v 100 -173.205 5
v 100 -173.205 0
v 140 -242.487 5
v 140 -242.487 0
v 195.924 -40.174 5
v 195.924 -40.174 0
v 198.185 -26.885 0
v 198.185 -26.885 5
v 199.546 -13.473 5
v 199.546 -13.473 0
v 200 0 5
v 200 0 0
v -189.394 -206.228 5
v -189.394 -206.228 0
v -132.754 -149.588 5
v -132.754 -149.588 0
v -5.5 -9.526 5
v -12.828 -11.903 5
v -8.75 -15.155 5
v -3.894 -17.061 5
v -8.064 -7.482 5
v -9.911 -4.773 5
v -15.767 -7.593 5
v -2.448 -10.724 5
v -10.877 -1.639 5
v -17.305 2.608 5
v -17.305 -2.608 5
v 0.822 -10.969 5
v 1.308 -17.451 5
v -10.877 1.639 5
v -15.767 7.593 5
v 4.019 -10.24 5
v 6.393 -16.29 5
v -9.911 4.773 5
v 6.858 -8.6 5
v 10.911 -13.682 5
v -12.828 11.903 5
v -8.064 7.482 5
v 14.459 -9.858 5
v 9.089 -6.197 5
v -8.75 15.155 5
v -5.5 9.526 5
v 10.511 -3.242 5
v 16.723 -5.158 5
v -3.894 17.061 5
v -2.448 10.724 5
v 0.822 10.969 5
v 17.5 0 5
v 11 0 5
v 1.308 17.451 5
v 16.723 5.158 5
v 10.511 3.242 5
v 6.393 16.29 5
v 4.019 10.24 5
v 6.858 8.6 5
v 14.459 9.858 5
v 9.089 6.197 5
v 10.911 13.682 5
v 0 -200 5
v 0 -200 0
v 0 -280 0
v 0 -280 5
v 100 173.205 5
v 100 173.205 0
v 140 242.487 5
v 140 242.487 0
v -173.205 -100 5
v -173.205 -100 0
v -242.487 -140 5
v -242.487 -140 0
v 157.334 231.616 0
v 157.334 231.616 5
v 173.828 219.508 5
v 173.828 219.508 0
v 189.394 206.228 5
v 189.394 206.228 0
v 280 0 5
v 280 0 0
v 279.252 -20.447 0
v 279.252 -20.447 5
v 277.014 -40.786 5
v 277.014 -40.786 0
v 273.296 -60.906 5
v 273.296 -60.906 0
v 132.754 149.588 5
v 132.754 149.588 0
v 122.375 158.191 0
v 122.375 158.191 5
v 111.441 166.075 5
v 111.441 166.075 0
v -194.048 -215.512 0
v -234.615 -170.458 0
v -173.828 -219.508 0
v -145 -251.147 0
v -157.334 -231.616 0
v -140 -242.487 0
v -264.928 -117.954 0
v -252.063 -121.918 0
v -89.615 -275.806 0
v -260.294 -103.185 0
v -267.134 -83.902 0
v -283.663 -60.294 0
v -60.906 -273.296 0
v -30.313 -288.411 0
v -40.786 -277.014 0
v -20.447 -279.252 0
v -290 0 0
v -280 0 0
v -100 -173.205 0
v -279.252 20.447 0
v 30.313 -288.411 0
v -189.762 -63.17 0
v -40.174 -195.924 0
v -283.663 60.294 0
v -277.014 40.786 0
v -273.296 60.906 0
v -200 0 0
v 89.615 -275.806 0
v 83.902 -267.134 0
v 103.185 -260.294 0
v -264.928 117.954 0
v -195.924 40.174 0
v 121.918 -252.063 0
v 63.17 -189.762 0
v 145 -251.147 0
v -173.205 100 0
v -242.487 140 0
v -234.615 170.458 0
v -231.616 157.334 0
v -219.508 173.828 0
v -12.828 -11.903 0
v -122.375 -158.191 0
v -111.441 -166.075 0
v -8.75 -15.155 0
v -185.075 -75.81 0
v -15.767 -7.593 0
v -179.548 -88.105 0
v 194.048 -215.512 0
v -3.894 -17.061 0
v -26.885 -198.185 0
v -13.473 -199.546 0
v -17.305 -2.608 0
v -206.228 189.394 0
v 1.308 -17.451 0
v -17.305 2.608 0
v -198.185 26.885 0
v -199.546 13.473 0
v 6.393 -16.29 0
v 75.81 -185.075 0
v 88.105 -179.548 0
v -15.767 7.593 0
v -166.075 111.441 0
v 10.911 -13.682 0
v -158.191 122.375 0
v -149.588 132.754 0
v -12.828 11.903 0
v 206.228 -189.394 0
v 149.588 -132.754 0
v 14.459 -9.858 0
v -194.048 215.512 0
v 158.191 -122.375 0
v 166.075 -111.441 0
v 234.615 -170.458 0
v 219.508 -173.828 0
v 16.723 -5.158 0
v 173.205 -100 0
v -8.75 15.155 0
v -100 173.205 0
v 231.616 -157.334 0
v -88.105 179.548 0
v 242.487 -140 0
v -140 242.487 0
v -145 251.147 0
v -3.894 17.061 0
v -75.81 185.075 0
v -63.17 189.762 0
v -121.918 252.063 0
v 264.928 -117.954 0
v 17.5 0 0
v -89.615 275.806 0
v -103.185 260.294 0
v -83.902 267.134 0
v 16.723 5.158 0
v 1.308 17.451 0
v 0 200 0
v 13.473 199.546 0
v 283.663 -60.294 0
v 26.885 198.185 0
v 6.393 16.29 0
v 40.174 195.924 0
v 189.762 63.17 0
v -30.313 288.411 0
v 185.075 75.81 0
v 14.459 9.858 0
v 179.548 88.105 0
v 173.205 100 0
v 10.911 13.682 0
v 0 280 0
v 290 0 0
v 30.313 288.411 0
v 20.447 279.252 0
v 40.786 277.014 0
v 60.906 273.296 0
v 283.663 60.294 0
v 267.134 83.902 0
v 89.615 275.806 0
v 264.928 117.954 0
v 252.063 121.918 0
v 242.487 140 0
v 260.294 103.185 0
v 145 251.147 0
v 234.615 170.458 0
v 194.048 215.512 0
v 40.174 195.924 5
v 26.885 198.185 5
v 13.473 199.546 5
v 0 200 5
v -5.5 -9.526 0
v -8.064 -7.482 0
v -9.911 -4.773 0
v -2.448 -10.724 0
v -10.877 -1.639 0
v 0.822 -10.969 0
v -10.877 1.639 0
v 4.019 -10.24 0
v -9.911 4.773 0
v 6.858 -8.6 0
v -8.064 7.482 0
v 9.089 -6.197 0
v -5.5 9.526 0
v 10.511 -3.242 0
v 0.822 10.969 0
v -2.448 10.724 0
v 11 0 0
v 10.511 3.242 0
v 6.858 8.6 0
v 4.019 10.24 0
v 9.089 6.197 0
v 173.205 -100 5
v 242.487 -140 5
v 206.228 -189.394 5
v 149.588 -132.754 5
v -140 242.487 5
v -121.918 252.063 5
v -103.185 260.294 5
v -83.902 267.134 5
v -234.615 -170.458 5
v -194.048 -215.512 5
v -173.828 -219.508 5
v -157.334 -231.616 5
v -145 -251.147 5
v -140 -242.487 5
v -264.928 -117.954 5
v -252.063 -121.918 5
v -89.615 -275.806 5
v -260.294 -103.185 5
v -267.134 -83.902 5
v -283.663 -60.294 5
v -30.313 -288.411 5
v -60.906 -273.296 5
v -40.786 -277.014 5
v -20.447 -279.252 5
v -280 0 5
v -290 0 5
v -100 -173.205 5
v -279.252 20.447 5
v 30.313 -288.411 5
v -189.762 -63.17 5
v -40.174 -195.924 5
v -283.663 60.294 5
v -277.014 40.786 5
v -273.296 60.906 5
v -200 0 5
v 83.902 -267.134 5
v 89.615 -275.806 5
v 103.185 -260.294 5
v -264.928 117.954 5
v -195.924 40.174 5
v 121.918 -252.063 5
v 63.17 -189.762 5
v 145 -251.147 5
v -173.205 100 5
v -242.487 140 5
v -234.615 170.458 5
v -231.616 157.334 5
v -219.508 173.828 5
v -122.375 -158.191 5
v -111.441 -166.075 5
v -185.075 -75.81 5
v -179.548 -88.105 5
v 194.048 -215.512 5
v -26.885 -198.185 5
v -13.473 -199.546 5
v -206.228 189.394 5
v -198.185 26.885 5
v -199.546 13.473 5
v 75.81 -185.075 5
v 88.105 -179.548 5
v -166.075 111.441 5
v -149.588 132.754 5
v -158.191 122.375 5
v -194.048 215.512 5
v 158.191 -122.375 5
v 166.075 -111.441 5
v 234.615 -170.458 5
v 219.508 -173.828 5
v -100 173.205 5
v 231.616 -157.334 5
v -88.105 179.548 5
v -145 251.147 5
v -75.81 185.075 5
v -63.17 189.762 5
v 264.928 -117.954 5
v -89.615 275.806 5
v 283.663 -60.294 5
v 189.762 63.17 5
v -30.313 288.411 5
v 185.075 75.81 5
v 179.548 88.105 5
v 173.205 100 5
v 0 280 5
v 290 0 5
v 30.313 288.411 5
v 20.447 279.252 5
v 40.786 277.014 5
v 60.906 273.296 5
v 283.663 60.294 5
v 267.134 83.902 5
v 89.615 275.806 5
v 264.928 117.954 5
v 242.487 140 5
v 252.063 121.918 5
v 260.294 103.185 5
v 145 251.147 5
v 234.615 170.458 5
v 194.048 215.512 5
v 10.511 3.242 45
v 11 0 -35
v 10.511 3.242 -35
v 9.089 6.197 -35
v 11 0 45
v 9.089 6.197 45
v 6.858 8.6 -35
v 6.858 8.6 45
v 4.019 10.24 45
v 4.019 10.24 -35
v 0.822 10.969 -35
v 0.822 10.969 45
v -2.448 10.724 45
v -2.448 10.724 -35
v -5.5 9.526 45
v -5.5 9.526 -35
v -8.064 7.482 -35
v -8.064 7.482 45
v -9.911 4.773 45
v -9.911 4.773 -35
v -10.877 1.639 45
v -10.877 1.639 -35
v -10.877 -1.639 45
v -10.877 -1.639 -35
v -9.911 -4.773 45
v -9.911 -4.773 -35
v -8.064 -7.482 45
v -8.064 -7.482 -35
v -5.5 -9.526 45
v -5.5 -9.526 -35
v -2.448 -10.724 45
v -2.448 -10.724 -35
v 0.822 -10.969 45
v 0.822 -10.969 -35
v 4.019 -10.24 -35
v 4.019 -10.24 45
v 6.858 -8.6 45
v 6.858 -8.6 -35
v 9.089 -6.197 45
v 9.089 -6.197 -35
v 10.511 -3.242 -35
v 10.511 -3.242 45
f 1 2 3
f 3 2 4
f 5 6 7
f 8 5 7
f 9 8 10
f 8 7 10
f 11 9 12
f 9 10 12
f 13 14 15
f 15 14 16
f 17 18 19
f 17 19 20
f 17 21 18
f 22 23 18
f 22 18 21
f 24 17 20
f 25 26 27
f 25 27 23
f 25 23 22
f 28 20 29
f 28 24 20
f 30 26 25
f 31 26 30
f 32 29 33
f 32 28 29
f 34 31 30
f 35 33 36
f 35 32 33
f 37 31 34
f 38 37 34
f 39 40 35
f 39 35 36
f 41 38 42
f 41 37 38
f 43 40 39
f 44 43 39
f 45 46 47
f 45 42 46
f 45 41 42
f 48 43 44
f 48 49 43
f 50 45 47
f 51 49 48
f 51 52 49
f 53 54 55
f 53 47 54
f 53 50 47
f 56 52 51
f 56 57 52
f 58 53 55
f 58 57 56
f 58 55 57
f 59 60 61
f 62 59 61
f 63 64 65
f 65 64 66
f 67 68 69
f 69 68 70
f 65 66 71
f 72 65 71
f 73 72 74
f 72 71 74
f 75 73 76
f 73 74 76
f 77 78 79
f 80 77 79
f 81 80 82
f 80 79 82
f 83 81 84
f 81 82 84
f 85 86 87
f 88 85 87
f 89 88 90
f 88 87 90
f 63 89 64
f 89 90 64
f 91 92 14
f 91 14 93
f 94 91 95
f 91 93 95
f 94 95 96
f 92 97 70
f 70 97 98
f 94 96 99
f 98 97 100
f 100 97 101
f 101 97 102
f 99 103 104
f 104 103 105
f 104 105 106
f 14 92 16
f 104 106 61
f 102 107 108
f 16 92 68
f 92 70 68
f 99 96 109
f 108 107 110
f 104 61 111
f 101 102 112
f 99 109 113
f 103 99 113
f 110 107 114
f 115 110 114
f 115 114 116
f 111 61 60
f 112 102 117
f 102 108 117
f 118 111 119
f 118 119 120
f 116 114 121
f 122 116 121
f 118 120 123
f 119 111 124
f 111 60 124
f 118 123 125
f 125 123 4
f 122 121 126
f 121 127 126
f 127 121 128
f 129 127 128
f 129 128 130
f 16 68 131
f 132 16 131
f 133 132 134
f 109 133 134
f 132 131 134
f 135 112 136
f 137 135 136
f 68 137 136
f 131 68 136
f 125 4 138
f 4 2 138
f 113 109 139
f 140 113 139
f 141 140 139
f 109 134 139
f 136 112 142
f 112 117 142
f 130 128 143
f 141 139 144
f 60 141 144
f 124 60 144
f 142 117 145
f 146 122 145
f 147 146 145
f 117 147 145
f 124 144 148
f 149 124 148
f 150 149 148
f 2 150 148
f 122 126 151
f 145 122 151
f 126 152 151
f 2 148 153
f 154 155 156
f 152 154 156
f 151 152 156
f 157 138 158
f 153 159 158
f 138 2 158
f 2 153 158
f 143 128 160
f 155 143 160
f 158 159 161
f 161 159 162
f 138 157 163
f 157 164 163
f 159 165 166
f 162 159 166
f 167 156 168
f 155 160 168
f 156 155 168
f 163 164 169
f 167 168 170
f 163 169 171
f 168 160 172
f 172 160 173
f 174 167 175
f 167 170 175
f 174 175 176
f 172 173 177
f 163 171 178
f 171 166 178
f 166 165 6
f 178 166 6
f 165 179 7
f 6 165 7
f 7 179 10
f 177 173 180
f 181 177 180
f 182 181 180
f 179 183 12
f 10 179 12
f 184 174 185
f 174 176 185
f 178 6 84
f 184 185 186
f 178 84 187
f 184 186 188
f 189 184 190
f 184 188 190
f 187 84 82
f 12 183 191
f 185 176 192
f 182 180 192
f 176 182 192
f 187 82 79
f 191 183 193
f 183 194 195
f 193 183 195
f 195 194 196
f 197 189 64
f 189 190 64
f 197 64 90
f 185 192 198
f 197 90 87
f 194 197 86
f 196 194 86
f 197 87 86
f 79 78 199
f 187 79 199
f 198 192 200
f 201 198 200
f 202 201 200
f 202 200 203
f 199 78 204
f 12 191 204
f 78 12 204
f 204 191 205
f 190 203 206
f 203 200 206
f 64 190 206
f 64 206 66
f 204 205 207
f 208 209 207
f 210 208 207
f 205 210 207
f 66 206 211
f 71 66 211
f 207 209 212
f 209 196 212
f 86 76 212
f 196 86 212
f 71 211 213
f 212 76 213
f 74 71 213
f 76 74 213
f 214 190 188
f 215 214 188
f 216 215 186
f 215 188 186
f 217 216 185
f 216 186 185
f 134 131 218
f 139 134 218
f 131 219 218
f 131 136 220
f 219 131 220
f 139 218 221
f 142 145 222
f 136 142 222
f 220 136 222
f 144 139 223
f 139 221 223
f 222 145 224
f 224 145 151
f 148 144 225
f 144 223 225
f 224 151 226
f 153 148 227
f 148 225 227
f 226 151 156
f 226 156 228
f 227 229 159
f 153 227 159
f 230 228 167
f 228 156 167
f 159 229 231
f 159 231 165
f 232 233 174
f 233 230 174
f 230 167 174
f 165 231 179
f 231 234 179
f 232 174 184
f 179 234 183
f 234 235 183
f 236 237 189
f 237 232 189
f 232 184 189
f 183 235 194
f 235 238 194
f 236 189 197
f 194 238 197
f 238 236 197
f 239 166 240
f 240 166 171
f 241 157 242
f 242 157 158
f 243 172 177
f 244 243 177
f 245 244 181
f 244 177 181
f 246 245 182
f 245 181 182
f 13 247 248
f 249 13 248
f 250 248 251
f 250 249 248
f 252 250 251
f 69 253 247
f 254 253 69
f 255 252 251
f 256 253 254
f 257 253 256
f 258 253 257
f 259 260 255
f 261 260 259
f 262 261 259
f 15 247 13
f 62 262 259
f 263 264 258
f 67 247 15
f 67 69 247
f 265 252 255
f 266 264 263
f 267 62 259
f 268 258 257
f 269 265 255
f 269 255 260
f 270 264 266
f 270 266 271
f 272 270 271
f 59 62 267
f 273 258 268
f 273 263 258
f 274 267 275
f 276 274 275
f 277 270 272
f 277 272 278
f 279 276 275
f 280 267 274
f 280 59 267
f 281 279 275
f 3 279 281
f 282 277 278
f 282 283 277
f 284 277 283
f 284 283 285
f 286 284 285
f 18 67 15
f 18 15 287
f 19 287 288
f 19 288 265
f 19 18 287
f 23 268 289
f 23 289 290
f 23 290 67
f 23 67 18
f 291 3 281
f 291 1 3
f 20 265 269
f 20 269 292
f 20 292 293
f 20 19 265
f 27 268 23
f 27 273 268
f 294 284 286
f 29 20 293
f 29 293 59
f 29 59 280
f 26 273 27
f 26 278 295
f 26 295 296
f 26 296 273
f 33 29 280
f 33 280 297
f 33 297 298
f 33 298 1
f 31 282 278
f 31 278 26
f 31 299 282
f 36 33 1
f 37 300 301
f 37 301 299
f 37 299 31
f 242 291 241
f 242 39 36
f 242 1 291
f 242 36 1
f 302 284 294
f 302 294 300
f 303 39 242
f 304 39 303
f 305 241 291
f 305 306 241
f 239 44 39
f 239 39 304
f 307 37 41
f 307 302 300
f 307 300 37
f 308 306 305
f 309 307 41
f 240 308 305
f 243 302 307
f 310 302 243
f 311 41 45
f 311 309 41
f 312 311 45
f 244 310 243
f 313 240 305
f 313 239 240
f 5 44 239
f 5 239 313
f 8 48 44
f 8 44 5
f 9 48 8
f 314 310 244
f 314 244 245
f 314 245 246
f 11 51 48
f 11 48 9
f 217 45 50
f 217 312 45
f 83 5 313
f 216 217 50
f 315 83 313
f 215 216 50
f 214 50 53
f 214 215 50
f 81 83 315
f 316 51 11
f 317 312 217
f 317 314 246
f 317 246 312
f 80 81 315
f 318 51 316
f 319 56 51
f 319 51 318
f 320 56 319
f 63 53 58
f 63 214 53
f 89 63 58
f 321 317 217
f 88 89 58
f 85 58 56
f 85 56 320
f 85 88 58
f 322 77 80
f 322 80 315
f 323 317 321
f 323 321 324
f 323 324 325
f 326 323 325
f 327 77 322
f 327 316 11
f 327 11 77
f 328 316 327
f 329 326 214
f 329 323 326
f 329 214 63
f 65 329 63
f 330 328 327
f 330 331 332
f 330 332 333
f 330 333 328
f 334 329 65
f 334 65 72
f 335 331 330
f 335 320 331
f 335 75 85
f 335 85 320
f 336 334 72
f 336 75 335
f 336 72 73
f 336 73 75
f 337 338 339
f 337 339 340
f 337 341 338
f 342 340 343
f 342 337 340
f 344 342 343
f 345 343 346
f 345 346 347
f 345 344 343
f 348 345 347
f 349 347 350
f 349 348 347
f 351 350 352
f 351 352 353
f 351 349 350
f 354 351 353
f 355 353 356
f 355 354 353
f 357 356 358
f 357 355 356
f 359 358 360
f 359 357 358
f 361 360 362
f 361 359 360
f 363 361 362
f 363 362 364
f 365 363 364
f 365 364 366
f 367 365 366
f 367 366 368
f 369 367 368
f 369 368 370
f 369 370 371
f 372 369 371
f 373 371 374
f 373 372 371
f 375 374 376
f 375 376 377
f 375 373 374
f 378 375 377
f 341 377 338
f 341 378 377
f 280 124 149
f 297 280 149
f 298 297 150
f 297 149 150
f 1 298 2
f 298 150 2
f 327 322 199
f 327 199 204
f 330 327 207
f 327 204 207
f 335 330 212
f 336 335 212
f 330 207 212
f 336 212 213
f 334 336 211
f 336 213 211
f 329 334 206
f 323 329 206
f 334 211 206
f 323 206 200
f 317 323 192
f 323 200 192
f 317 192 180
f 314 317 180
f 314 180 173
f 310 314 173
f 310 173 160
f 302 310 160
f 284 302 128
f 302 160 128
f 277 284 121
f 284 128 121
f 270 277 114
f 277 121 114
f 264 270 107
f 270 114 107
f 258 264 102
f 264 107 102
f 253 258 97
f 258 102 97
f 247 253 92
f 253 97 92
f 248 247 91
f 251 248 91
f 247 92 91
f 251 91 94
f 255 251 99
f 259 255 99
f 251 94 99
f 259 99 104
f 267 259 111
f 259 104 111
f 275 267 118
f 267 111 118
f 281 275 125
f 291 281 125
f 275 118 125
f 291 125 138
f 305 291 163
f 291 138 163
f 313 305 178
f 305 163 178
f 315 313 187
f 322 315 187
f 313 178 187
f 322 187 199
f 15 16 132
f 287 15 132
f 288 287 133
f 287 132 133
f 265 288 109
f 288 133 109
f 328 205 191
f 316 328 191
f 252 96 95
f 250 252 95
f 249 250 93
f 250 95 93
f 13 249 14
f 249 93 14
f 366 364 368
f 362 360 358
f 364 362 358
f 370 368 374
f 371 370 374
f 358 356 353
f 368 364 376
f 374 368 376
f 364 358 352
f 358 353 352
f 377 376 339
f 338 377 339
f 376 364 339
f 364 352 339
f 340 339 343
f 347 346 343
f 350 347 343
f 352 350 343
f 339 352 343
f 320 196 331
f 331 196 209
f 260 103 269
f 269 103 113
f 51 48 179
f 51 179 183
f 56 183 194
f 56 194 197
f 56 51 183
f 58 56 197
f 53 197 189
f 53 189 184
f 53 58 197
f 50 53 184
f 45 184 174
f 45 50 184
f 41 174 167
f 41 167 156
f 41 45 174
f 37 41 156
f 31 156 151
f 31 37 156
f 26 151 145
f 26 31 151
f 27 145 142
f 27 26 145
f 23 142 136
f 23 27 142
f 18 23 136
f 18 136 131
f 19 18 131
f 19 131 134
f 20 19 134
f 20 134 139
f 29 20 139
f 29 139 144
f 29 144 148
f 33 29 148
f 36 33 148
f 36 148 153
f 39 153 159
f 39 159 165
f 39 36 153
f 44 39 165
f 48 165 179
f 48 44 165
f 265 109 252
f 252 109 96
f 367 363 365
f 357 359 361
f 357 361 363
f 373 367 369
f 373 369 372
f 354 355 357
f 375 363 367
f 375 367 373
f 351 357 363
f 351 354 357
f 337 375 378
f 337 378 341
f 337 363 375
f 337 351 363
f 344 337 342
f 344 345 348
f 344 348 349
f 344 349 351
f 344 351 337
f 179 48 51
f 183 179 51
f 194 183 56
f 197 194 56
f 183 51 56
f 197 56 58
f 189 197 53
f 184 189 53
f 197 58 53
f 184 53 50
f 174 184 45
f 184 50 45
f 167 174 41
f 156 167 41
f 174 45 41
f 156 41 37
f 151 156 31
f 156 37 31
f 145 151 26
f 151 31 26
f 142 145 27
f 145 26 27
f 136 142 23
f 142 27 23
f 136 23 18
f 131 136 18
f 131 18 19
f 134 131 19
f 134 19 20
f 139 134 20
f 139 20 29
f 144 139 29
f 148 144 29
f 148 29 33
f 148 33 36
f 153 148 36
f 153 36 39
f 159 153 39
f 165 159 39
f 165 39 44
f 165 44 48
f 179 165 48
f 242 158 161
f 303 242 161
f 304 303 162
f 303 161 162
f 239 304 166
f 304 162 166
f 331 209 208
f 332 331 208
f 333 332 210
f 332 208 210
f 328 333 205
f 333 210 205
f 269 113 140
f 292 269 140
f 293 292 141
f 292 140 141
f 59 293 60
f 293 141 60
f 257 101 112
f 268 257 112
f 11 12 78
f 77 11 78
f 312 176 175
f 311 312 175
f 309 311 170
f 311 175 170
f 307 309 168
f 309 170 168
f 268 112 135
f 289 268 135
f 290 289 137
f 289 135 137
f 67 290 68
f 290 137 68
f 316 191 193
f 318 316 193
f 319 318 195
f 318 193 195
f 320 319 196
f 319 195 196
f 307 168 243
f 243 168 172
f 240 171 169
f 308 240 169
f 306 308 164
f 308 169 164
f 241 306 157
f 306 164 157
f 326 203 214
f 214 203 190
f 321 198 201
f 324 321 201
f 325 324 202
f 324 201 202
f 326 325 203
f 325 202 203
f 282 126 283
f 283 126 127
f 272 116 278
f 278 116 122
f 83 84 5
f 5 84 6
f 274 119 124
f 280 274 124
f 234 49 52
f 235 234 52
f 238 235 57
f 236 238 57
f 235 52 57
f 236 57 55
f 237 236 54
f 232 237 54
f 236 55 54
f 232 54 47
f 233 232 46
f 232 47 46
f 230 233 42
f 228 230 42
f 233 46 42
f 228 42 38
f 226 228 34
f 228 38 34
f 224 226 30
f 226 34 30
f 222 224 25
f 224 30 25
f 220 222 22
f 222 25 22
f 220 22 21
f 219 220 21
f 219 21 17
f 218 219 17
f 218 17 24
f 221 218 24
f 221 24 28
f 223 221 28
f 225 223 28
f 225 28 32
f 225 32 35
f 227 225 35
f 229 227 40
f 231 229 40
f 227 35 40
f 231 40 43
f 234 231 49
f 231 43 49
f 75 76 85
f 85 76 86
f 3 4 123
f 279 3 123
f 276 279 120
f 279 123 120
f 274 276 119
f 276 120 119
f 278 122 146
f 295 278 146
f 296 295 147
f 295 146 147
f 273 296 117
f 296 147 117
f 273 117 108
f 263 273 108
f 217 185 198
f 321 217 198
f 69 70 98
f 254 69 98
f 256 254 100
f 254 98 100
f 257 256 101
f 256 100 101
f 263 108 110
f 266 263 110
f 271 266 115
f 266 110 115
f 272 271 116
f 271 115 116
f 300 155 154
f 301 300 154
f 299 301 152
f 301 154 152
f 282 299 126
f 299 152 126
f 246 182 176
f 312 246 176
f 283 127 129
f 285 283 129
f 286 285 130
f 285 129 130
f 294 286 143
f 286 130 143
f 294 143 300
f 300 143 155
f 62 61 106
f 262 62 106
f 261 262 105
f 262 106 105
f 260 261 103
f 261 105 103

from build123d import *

# Parameters (mm, degrees)
F0_R      = 290
F1_DEPTH  = 5
F2_R      = 11
F3_DEPTH  = 25
F4_DEPTH  = 40
F5_R      = 143.6188138999
F5_R_2    = 11
F6_DEPTH  = 5
F7_R      = 17.5
F7_R_2    = 11
F8_DEPTH  = 25
F9_R      = 17.5
F9_R_2    = 11
F10_DEPTH = 5


with BuildPart() as f1:
    # F0 (on Top) → F1 (new body)
    with BuildSketch(Plane.XY):
        Circle(F0_R)
        with BuildLine():
            Line((-60.9060232783, -273.2955475825), (-40.1742534792, -195.9235293613))
            ThreePointArc((-40.1742534792, -195.9235293613), (-20.1902715155, -198.9782725227), (0, -200))
            Line((0, -200), (0, -280))
            ThreePointArc((0, -280), (-30.6369603331, -278.3188399328), (-60.9060232783, -273.2955475825))
        make_face(mode=Mode.SUBTRACT)
        with BuildLine():
            Line((-189.3939371938, -206.2278753084), (-132.7536887717, -149.5876268864))
            ThreePointArc((-132.7536887717, -149.5876268864), (-116.9744243031, -162.2251030481), (-100, -173.2050807569))
            Line((-100, -173.2050807569), (-140, -242.4871130596))
            ThreePointArc((-140, -242.4871130596), (-165.6918059096, -225.7127055671), (-189.3939371938, -206.2278753084))
        make_face(mode=Mode.SUBTRACT)
        with BuildLine():
            Line((-267.1338985868, -83.9016103887), (-189.7618803656, -63.1698405896))
            ThreePointArc((-189.7618803656, -63.1698405896), (-182.4153745636, -82.0038482196), (-173.2050807569, -100))
            Line((-173.2050807569, -100), (-242.4871130596, -140))
            ThreePointArc((-242.4871130596, -140), (-256.3496659002, -112.6270340232), (-267.1338985868, -83.9016103887))
        make_face(mode=Mode.SUBTRACT)
        with BuildLine():
            Line((-87.8987052892, -104.7543223331), (-73.813275879, -87.9678451288))
            ThreePointArc((-73.813275879, -87.9678451288), (-70.6984313943, -90.4901832852), (-67.4974601638, -92.9022838472))
            Line((-67.4974601638, -92.9022838472), (-80.3776730954, -110.6303760581))
            ThreePointArc((-80.3776730954, -110.6303760581), (-84.1894701397, -107.7579860455), (-87.8987052892, -104.7543223331))
        make_face(mode=Mode.SUBTRACT)
        with BuildLine():
            Line((-103.2037127424, -89.7142358557), (-86.6657147603, -75.337874656))
            ThreePointArc((-86.6657147603, -75.337874656), (-83.9837998001, -78.3164276747), (-81.1995734982, -81.1995734982))
            Line((-81.1995734982, -81.1995734982), (-96.6944942564, -96.6944942564))
            ThreePointArc((-96.6944942564, -96.6944942564), (-100.0100209587, -93.2611716998), (-103.2037127424, -89.7142358557))
        make_face(mode=Mode.SUBTRACT)
        with BuildLine():
            Line((-70.4293399927, -117.215009735), (-59.1433091734, -98.431755306))
            ThreePointArc((-59.1433091734, -98.431755306), (-55.6722329729, -100.4357702634), (-52.1333353489, -102.3174316429))
            Line((-52.1333353489, -102.3174316429), (-62.0816868647, -121.8421708401))
            ThreePointArc((-62.0816868647, -121.8421708401), (-66.295895157, -119.6014411465), (-70.4293399927, -117.215009735))
        make_face(mode=Mode.SUBTRACT)
        with BuildLine():
            Line((-51.225770604, -126.7894745829), (-43.0170379105, -106.4719489913))
            ThreePointArc((-43.0170379105, -106.4719489913), (-39.2751994101, -107.9082952506), (-35.4855147971, -109.2131846994))
            Line((-35.4855147971, -109.2131846994), (-42.257043466, -130.053807005))
            ThreePointArc((-42.257043466, -130.053807005), (-46.7698952121, -128.499911832), (-51.225770604, -126.7894745829))
        make_face(mode=Mode.SUBTRACT)
        with BuildLine():
            Line((-30.7608527345, -133.2419617765), (-25.8315444089, -111.8904499323))
            ThreePointArc((-25.8315444089, -111.8904499323), (-21.911080091, -112.7237598816), (-17.9639231014, -113.4197466908))
            Line((-17.9639231014, -113.4197466908), (-21.3918914141, -135.0630868177))
            ThreePointArc((-21.3918914141, -135.0630868177), (-26.0922652267, -134.2342882215), (-30.7608527345, -133.2419617765))
        make_face(mode=Mode.SUBTRACT)
        with BuildLine():
            Line((-9.5385005812, -136.4135896663), (-8.009992554, -114.5538366528))
            ThreePointArc((-8.009992554, -114.5538366528), (-4.0074372614, -114.7635914356), (0, -114.8335381001))
            Line((0, -114.8335381001), (0, -136.7466651842))
            ThreePointArc((0, -136.7466651842), (-4.7721570762, -136.6633709369), (-9.5385005812, -136.4135896663))
        make_face(mode=Mode.SUBTRACT)
        with BuildLine():
            Line((-125.8757870263, -53.4316074951), (-105.704676351, -44.8693979248))
            ThreePointArc((-105.704676351, -44.8693979248), (-104.0744471533, -48.5309274826), (-102.3174316429, -52.1333353489))
            Line((-102.3174316429, -52.1333353489), (-121.8421708401, -62.0816868647))
            ThreePointArc((-121.8421708401, -62.0816868647), (-123.9344690982, -57.7918489784), (-125.8757870263, -53.4316074951))
        make_face(mode=Mode.SUBTRACT)
        with BuildLine():
            Line((-115.9675022744, -72.4650871471), (-97.3841561172, -60.852835677))
            ThreePointArc((-97.3841561172, -60.852835677), (-95.2012083286, -64.2142616976), (-92.9022838472, -67.4974601638))
            Line((-92.9022838472, -67.4974601638), (-110.6303760581, -80.3776730954))
            ThreePointArc((-110.6303760581, -80.3776730954), (-113.3679931475, -76.4679577908), (-115.9675022744, -72.4650871471))
        make_face(mode=Mode.SUBTRACT)
        with BuildLine():
            Line((-132.6845921438, -33.0824643372), (-111.4223966393, -27.7811266826))
            ThreePointArc((-111.4223966393, -27.7811266826), (-110.3850276859, -31.652600768), (-109.2131846994, -35.4855147971))
            Line((-109.2131846994, -35.4855147971), (-130.053807005, -42.257043466))
            ThreePointArc((-130.053807005, -42.257043466), (-131.4492671047, -37.692713044), (-132.6845921438, -33.0824643372))
        make_face(mode=Mode.SUBTRACT)
        with BuildLine():
            Line((-136.2262622479, -11.9187211129), (-114.3965277326, -10.0087919012))
            ThreePointArc((-114.3965277326, -10.0087919012), (-113.9775624899, -13.9948819736), (-113.4197466908, -17.9639231014))
            Line((-113.4197466908, -17.9639231014), (-135.0630868177, -21.3918914141))
            ThreePointArc((-135.0630868177, -21.3918914141), (-135.7273479001, -16.6654574195), (-136.2262622479, -11.9187211129))
        make_face(mode=Mode.SUBTRACT)
        with BuildLine():
            Line((83.9016103887, -267.1338985868), (63.1698405896, -189.7618803656))
            ThreePointArc((63.1698405896, -189.7618803656), (82.0038482196, -182.4153745636), (100, -173.2050807569))
            Line((100, -173.2050807569), (140, -242.4871130596))
            ThreePointArc((140, -242.4871130596), (112.6270340232, -256.3496659002), (83.9016103887, -267.1338985868))
        make_face(mode=Mode.SUBTRACT)
        with BuildLine():
            Line((11.9187211129, -136.2262622479), (10.0087919012, -114.3965277326))
            ThreePointArc((10.0087919012, -114.3965277326), (13.9948819736, -113.9775624899), (17.9639231014, -113.4197466908))
            Line((17.9639231014, -113.4197466908), (21.3918914141, -135.0630868177))
            ThreePointArc((21.3918914141, -135.0630868177), (16.6654574195, -135.7273479001), (11.9187211129, -136.2262622479))
        make_face(mode=Mode.SUBTRACT)
        with BuildLine():
            Line((33.0824643372, -132.6845921438), (27.7811266826, -111.4223966393))
            ThreePointArc((27.7811266826, -111.4223966393), (31.652600768, -110.3850276859), (35.4855147971, -109.2131846994))
            Line((35.4855147971, -109.2131846994), (42.257043466, -130.053807005))
            ThreePointArc((42.257043466, -130.053807005), (37.692713044, -131.4492671047), (33.0824643372, -132.6845921438))
        make_face(mode=Mode.SUBTRACT)
        with BuildLine():
            Line((53.4316074951, -125.8757870263), (44.8693979248, -105.704676351))
            ThreePointArc((44.8693979248, -105.704676351), (48.5309274826, -104.0744471533), (52.1333353489, -102.3174316429))
            Line((52.1333353489, -102.3174316429), (62.0816868647, -121.8421708401))
            ThreePointArc((62.0816868647, -121.8421708401), (57.7918489784, -123.9344690982), (53.4316074951, -125.8757870263))
        make_face(mode=Mode.SUBTRACT)
        with BuildLine():
            Line((72.4650871471, -115.9675022744), (60.852835677, -97.3841561172))
            ThreePointArc((60.852835677, -97.3841561172), (64.2142616976, -95.2012083286), (67.4974601638, -92.9022838472))
            Line((67.4974601638, -92.9022838472), (80.3776730954, -110.6303760581))
            ThreePointArc((80.3776730954, -110.6303760581), (76.4679577908, -113.3679931475), (72.4650871471, -115.9675022744))
        make_face(mode=Mode.SUBTRACT)
        with BuildLine():
            Line((89.7142358557, -103.2037127424), (75.337874656, -86.6657147603))
            ThreePointArc((75.337874656, -86.6657147603), (78.3164276747, -83.9837998001), (81.1995734982, -81.1995734982))
            Line((81.1995734982, -81.1995734982), (96.6944942564, -96.6944942564))
            ThreePointArc((96.6944942564, -96.6944942564), (93.2611716998, -100.0100209587), (89.7142358557, -103.2037127424))
        make_face(mode=Mode.SUBTRACT)
        with BuildLine():
            Line((104.7543223331, -87.8987052892), (87.9678451288, -73.813275879))
            ThreePointArc((87.9678451288, -73.813275879), (90.4901832852, -70.6984313943), (92.9022838472, -67.4974601638))
            Line((92.9022838472, -67.4974601638), (110.6303760581, -80.3776730954))
            ThreePointArc((110.6303760581, -80.3776730954), (107.7579860455, -84.1894701397), (104.7543223331, -87.8987052892))
        make_face(mode=Mode.SUBTRACT)
        with BuildLine():
            Line((117.215009735, -70.4293399927), (98.431755306, -59.1433091734))
            ThreePointArc((98.431755306, -59.1433091734), (100.4357702634, -55.6722329729), (102.3174316429, -52.1333353489))
            Line((102.3174316429, -52.1333353489), (121.8421708401, -62.0816868647))
            ThreePointArc((121.8421708401, -62.0816868647), (119.6014411465, -66.295895157), (117.215009735, -70.4293399927))
        make_face(mode=Mode.SUBTRACT)
        with BuildLine():
            Line((126.7894745829, -51.225770604), (106.4719489913, -43.0170379105))
            ThreePointArc((106.4719489913, -43.0170379105), (107.9082952506, -39.2751994101), (109.2131846994, -35.4855147971))
            Line((109.2131846994, -35.4855147971), (130.053807005, -42.257043466))
            ThreePointArc((130.053807005, -42.257043466), (128.499911832, -46.7698952121), (126.7894745829, -51.225770604))
        make_face(mode=Mode.SUBTRACT)
        with BuildLine():
            Line((133.2419617765, -30.7608527345), (111.8904499323, -25.8315444089))
            ThreePointArc((111.8904499323, -25.8315444089), (112.7237598816, -21.911080091), (113.4197466908, -17.9639231014))
            Line((113.4197466908, -17.9639231014), (135.0630868177, -21.3918914141))
            ThreePointArc((135.0630868177, -21.3918914141), (134.2342882215, -26.0922652267), (133.2419617765, -30.7608527345))
        make_face(mode=Mode.SUBTRACT)
        with BuildLine():
            Line((136.4135896663, -9.5385005812), (114.5538366528, -8.009992554))
            ThreePointArc((114.5538366528, -8.009992554), (114.7635914356, -4.0074372614), (114.8335381001, 0))
            Line((114.8335381001, 0), (136.7466651842, 0))
            ThreePointArc((136.7466651842, 0), (136.6633709369, -4.7721570762), (136.4135896663, -9.5385005812))
        make_face(mode=Mode.SUBTRACT)
        with BuildLine():
            Line((206.2278753084, -189.3939371938), (149.5876268864, -132.7536887717))
            ThreePointArc((149.5876268864, -132.7536887717), (162.2251030481, -116.9744243031), (173.2050807569, -100))
            Line((173.2050807569, -100), (242.4871130596, -140))
            ThreePointArc((242.4871130596, -140), (225.7127055671, -165.6918059096), (206.2278753084, -189.3939371938))
        make_face(mode=Mode.SUBTRACT)
        with BuildLine():
            Line((273.2955475825, -60.9060232783), (195.9235293613, -40.1742534792))
            ThreePointArc((195.9235293613, -40.1742534792), (198.9782725227, -20.1902715155), (200, 0))
            Line((200, 0), (280, 0))
            ThreePointArc((280, 0), (278.3188399328, -30.6369603331), (273.2955475825, -60.9060232783))
        make_face(mode=Mode.SUBTRACT)
        with BuildLine():
            Line((-273.2955475825, 60.9060232783), (-195.9235293613, 40.1742534792))
            ThreePointArc((-195.9235293613, 40.1742534792), (-198.9782725227, 20.1902715155), (-200, 0))
            Line((-200, 0), (-280, 0))
            ThreePointArc((-280, 0), (-278.3188399328, 30.6369603331), (-273.2955475825, 60.9060232783))
        make_face(mode=Mode.SUBTRACT)
        with BuildLine():
            Line((-206.2278753084, 189.3939371938), (-149.5876268864, 132.7536887717))
            ThreePointArc((-149.5876268864, 132.7536887717), (-162.2251030481, 116.9744243031), (-173.2050807569, 100))
            Line((-173.2050807569, 100), (-242.4871130596, 140))
            ThreePointArc((-242.4871130596, 140), (-225.7127055671, 165.6918059096), (-206.2278753084, 189.3939371938))
        make_face(mode=Mode.SUBTRACT)
        with BuildLine():
            Line((-136.4135896663, 9.5385005812), (-114.5538366528, 8.009992554))
            ThreePointArc((-114.5538366528, 8.009992554), (-114.7635914356, 4.0074372614), (-114.8335381001, 0))
            Line((-114.8335381001, 0), (-136.7466651842, 0))
            ThreePointArc((-136.7466651842, 0), (-136.6633709369, 4.7721570762), (-136.4135896663, 9.5385005812))
        make_face(mode=Mode.SUBTRACT)
        with BuildLine():
            Line((-133.2419617765, 30.7608527345), (-111.8904499323, 25.8315444089))
            ThreePointArc((-111.8904499323, 25.8315444089), (-112.7237598816, 21.911080091), (-113.4197466908, 17.9639231014))
            Line((-113.4197466908, 17.9639231014), (-135.0630868177, 21.3918914141))
            ThreePointArc((-135.0630868177, 21.3918914141), (-134.2342882215, 26.0922652267), (-133.2419617765, 30.7608527345))
        make_face(mode=Mode.SUBTRACT)
        with BuildLine():
            Line((-126.7894745829, 51.225770604), (-106.4719489913, 43.0170379105))
            ThreePointArc((-106.4719489913, 43.0170379105), (-107.9082952506, 39.2751994101), (-109.2131846994, 35.4855147971))
            Line((-109.2131846994, 35.4855147971), (-130.053807005, 42.257043466))
            ThreePointArc((-130.053807005, 42.257043466), (-128.499911832, 46.7698952121), (-126.7894745829, 51.225770604))
        make_face(mode=Mode.SUBTRACT)
        with BuildLine():
            Line((-117.215009735, 70.4293399927), (-98.431755306, 59.1433091734))
            ThreePointArc((-98.431755306, 59.1433091734), (-100.4357702634, 55.6722329729), (-102.3174316429, 52.1333353489))
            Line((-102.3174316429, 52.1333353489), (-121.8421708401, 62.0816868647))
            ThreePointArc((-121.8421708401, 62.0816868647), (-119.6014411465, 66.295895157), (-117.215009735, 70.4293399927))
        make_face(mode=Mode.SUBTRACT)
        with BuildLine():
            Line((-104.7543223331, 87.8987052892), (-87.9678451288, 73.813275879))
            ThreePointArc((-87.9678451288, 73.813275879), (-90.4901832852, 70.6984313943), (-92.9022838472, 67.4974601638))
            Line((-92.9022838472, 67.4974601638), (-110.6303760581, 80.3776730954))
            ThreePointArc((-110.6303760581, 80.3776730954), (-107.7579860455, 84.1894701397), (-104.7543223331, 87.8987052892))
        make_face(mode=Mode.SUBTRACT)
        with BuildLine():
            Line((-89.7142358557, 103.2037127424), (-75.337874656, 86.6657147603))
            ThreePointArc((-75.337874656, 86.6657147603), (-78.3164276747, 83.9837998001), (-81.1995734982, 81.1995734982))
            Line((-81.1995734982, 81.1995734982), (-96.6944942564, 96.6944942564))
            ThreePointArc((-96.6944942564, 96.6944942564), (-93.2611716998, 100.0100209587), (-89.7142358557, 103.2037127424))
        make_face(mode=Mode.SUBTRACT)
        with BuildLine():
            Line((-72.4650871471, 115.9675022744), (-60.852835677, 97.3841561172))
            ThreePointArc((-60.852835677, 97.3841561172), (-64.2142616976, 95.2012083286), (-67.4974601638, 92.9022838472))
            Line((-67.4974601638, 92.9022838472), (-80.3776730954, 110.6303760581))
            ThreePointArc((-80.3776730954, 110.6303760581), (-76.4679577908, 113.3679931475), (-72.4650871471, 115.9675022744))
        make_face(mode=Mode.SUBTRACT)
        with BuildLine():
            Line((-53.4316074951, 125.8757870263), (-44.8693979248, 105.704676351))
            ThreePointArc((-44.8693979248, 105.704676351), (-48.5309274826, 104.0744471533), (-52.1333353489, 102.3174316429))
            Line((-52.1333353489, 102.3174316429), (-62.0816868647, 121.8421708401))
            ThreePointArc((-62.0816868647, 121.8421708401), (-57.7918489784, 123.9344690982), (-53.4316074951, 125.8757870263))
        make_face(mode=Mode.SUBTRACT)
        with BuildLine():
            Line((-33.0824643372, 132.6845921438), (-27.7811266826, 111.4223966393))
            ThreePointArc((-27.7811266826, 111.4223966393), (-31.652600768, 110.3850276859), (-35.4855147971, 109.2131846994))
            Line((-35.4855147971, 109.2131846994), (-42.257043466, 130.053807005))
            ThreePointArc((-42.257043466, 130.053807005), (-37.692713044, 131.4492671047), (-33.0824643372, 132.6845921438))
        make_face(mode=Mode.SUBTRACT)
        with BuildLine():
            Line((-11.9187211129, 136.2262622479), (-10.0087919012, 114.3965277326))
            ThreePointArc((-10.0087919012, 114.3965277326), (-13.9948819736, 113.9775624899), (-17.9639231014, 113.4197466908))
            Line((-17.9639231014, 113.4197466908), (-21.3918914141, 135.0630868177))
            ThreePointArc((-21.3918914141, 135.0630868177), (-16.6654574195, 135.7273479001), (-11.9187211129, 136.2262622479))
        make_face(mode=Mode.SUBTRACT)
        with BuildLine():
            Line((-83.9016103887, 267.1338985868), (-63.1698405896, 189.7618803656))
            ThreePointArc((-63.1698405896, 189.7618803656), (-82.0038482196, 182.4153745636), (-100, 173.2050807569))
            Line((-100, 173.2050807569), (-140, 242.4871130596))
            ThreePointArc((-140, 242.4871130596), (-112.6270340232, 256.3496659002), (-83.9016103887, 267.1338985868))
        make_face(mode=Mode.SUBTRACT)
        Polygon((5, 5), (5, -5), (-5, -5), (-5, 5), (0, 5), align=None, mode=Mode.SUBTRACT)
        with BuildLine():
            Line((136.2262622479, 11.9187211129), (114.3965277326, 10.0087919012))
            ThreePointArc((114.3965277326, 10.0087919012), (113.9775624899, 13.9948819736), (113.4197466908, 17.9639231014))
            Line((113.4197466908, 17.9639231014), (135.0630868177, 21.3918914141))
            ThreePointArc((135.0630868177, 21.3918914141), (135.7273479001, 16.6654574195), (136.2262622479, 11.9187211129))
        make_face(mode=Mode.SUBTRACT)
        with BuildLine():
            Line((132.6845921438, 33.0824643372), (111.4223966393, 27.7811266826))
            ThreePointArc((111.4223966393, 27.7811266826), (110.3850276859, 31.652600768), (109.2131846994, 35.4855147971))
            Line((109.2131846994, 35.4855147971), (130.053807005, 42.257043466))
            ThreePointArc((130.053807005, 42.257043466), (131.4492671047, 37.692713044), (132.6845921438, 33.0824643372))
        make_face(mode=Mode.SUBTRACT)
        with BuildLine():
            Line((115.9675022744, 72.4650871471), (97.3841561172, 60.852835677))
            ThreePointArc((97.3841561172, 60.852835677), (95.2012083286, 64.2142616976), (92.9022838472, 67.4974601638))
            Line((92.9022838472, 67.4974601638), (110.6303760581, 80.3776730954))
            ThreePointArc((110.6303760581, 80.3776730954), (113.3679931475, 76.4679577908), (115.9675022744, 72.4650871471))
        make_face(mode=Mode.SUBTRACT)
        with BuildLine():
            Line((125.8757870263, 53.4316074951), (105.704676351, 44.8693979248))
            ThreePointArc((105.704676351, 44.8693979248), (104.0744471533, 48.5309274826), (102.3174316429, 52.1333353489))
            Line((102.3174316429, 52.1333353489), (121.8421708401, 62.0816868647))
            ThreePointArc((121.8421708401, 62.0816868647), (123.9344690982, 57.7918489784), (125.8757870263, 53.4316074951))
        make_face(mode=Mode.SUBTRACT)
        with BuildLine():
            ThreePointArc((0, 136.7466651842), (4.7721570762, 136.6633709369), (9.5385005812, 136.4135896663))
            Line((9.5385005812, 136.4135896663), (8.009992554, 114.5538366528))
            ThreePointArc((8.009992554, 114.5538366528), (4.0074372614, 114.7635914356), (0, 114.8335381001))
            Line((0, 114.8335381001), (0, 136.7466651842))
        make_face(mode=Mode.SUBTRACT)
        with BuildLine():
            Line((30.7608527345, 133.2419617765), (25.8315444089, 111.8904499323))
            ThreePointArc((25.8315444089, 111.8904499323), (21.911080091, 112.7237598816), (17.9639231014, 113.4197466908))
            Line((17.9639231014, 113.4197466908), (21.3918914141, 135.0630868177))
            ThreePointArc((21.3918914141, 135.0630868177), (26.0922652267, 134.2342882215), (30.7608527345, 133.2419617765))
        make_face(mode=Mode.SUBTRACT)
        with BuildLine():
            Line((51.225770604, 126.7894745829), (43.0170379105, 106.4719489913))
            ThreePointArc((43.0170379105, 106.4719489913), (39.2751994101, 107.9082952506), (35.4855147971, 109.2131846994))
            Line((35.4855147971, 109.2131846994), (42.257043466, 130.053807005))
            ThreePointArc((42.257043466, 130.053807005), (46.7698952121, 128.499911832), (51.225770604, 126.7894745829))
        make_face(mode=Mode.SUBTRACT)
        with BuildLine():
            Line((70.4293399927, 117.215009735), (59.1433091734, 98.431755306))
            ThreePointArc((59.1433091734, 98.431755306), (55.6722329729, 100.4357702634), (52.1333353489, 102.3174316429))
            Line((52.1333353489, 102.3174316429), (62.0816868647, 121.8421708401))
            ThreePointArc((62.0816868647, 121.8421708401), (66.295895157, 119.6014411465), (70.4293399927, 117.215009735))
        make_face(mode=Mode.SUBTRACT)
        with BuildLine():
            Line((103.2037127424, 89.7142358557), (86.6657147603, 75.337874656))
            ThreePointArc((86.6657147603, 75.337874656), (83.9837998001, 78.3164276747), (81.1995734982, 81.1995734982))
            Line((81.1995734982, 81.1995734982), (96.6944942564, 96.6944942564))
            ThreePointArc((96.6944942564, 96.6944942564), (100.0100209587, 93.2611716998), (103.2037127424, 89.7142358557))
        make_face(mode=Mode.SUBTRACT)
        with BuildLine():
            Line((87.8987052892, 104.7543223331), (73.813275879, 87.9678451288))
            ThreePointArc((73.813275879, 87.9678451288), (70.6984313943, 90.4901832852), (67.4974601638, 92.9022838472))
            Line((67.4974601638, 92.9022838472), (80.3776730954, 110.6303760581))
            ThreePointArc((80.3776730954, 110.6303760581), (84.1894701397, 107.7579860455), (87.8987052892, 104.7543223331))
        make_face(mode=Mode.SUBTRACT)
        with BuildLine():
            Line((267.1338985868, 83.9016103887), (189.7618803656, 63.1698405896))
            ThreePointArc((189.7618803656, 63.1698405896), (182.4153745636, 82.0038482196), (173.2050807569, 100))
            Line((173.2050807569, 100), (242.4871130596, 140))
            ThreePointArc((242.4871130596, 140), (256.3496659002, 112.6270340232), (267.1338985868, 83.9016103887))
        make_face(mode=Mode.SUBTRACT)
        with BuildLine():
            Line((189.3939371938, 206.2278753084), (132.7536887717, 149.5876268864))
            ThreePointArc((132.7536887717, 149.5876268864), (116.9744243031, 162.2251030481), (100, 173.2050807569))
            Line((100, 173.2050807569), (140, 242.4871130596))
            ThreePointArc((140, 242.4871130596), (165.6918059096, 225.7127055671), (189.3939371938, 206.2278753084))
        make_face(mode=Mode.SUBTRACT)
        with BuildLine():
            Line((60.9060232783, 273.2955475825), (40.1742534792, 195.9235293613))
            ThreePointArc((40.1742534792, 195.9235293613), (20.1902715155, 198.9782725227), (0, 200))
            Line((0, 200), (0, 280))
            ThreePointArc((0, 280), (30.6369603331, 278.3188399328), (60.9060232783, 273.2955475825))
        make_face(mode=Mode.SUBTRACT)
    extrude(amount=F1_DEPTH)

    # F2 (on face) → F3 (cut)
    with BuildSketch(Plane.XY.offset(5)):
        Circle(F2_R)
    extrude(amount=-F3_DEPTH, mode=Mode.SUBTRACT)



with BuildPart() as f4:
    # F2 (on face) → F4 (new body, symmetric)
    with BuildSketch(Plane.XY.offset(5)):
        Circle(F2_R)
    extrude(amount=F4_DEPTH, both=True)


with BuildPart() as f1_1:
    add(f1.part)

    add(f4.part)  # F6 merges F4
    # F5 (on face) → F6 (join)
    with BuildSketch(Plane.XY.offset(5)):
        Circle(F5_R)
        Circle(F5_R_2, mode=Mode.SUBTRACT)
    extrude(amount=-F6_DEPTH)

    # F7 (on face) → F8 (cut)
    with BuildSketch(Plane.XY.offset(5)):
        Circle(F7_R)
        Circle(F7_R_2, mode=Mode.SUBTRACT)
    extrude(amount=-F8_DEPTH, mode=Mode.SUBTRACT)


with BuildPart() as f10:
    # F9 (on face) → F10 (new body)
    with BuildSketch(Plane.XY.offset(5)):
        Circle(F9_R)
        Circle(F9_R_2, mode=Mode.SUBTRACT)
    extrude(amount=-F10_DEPTH)


solid = Compound([f1_1.part, f10.part])
